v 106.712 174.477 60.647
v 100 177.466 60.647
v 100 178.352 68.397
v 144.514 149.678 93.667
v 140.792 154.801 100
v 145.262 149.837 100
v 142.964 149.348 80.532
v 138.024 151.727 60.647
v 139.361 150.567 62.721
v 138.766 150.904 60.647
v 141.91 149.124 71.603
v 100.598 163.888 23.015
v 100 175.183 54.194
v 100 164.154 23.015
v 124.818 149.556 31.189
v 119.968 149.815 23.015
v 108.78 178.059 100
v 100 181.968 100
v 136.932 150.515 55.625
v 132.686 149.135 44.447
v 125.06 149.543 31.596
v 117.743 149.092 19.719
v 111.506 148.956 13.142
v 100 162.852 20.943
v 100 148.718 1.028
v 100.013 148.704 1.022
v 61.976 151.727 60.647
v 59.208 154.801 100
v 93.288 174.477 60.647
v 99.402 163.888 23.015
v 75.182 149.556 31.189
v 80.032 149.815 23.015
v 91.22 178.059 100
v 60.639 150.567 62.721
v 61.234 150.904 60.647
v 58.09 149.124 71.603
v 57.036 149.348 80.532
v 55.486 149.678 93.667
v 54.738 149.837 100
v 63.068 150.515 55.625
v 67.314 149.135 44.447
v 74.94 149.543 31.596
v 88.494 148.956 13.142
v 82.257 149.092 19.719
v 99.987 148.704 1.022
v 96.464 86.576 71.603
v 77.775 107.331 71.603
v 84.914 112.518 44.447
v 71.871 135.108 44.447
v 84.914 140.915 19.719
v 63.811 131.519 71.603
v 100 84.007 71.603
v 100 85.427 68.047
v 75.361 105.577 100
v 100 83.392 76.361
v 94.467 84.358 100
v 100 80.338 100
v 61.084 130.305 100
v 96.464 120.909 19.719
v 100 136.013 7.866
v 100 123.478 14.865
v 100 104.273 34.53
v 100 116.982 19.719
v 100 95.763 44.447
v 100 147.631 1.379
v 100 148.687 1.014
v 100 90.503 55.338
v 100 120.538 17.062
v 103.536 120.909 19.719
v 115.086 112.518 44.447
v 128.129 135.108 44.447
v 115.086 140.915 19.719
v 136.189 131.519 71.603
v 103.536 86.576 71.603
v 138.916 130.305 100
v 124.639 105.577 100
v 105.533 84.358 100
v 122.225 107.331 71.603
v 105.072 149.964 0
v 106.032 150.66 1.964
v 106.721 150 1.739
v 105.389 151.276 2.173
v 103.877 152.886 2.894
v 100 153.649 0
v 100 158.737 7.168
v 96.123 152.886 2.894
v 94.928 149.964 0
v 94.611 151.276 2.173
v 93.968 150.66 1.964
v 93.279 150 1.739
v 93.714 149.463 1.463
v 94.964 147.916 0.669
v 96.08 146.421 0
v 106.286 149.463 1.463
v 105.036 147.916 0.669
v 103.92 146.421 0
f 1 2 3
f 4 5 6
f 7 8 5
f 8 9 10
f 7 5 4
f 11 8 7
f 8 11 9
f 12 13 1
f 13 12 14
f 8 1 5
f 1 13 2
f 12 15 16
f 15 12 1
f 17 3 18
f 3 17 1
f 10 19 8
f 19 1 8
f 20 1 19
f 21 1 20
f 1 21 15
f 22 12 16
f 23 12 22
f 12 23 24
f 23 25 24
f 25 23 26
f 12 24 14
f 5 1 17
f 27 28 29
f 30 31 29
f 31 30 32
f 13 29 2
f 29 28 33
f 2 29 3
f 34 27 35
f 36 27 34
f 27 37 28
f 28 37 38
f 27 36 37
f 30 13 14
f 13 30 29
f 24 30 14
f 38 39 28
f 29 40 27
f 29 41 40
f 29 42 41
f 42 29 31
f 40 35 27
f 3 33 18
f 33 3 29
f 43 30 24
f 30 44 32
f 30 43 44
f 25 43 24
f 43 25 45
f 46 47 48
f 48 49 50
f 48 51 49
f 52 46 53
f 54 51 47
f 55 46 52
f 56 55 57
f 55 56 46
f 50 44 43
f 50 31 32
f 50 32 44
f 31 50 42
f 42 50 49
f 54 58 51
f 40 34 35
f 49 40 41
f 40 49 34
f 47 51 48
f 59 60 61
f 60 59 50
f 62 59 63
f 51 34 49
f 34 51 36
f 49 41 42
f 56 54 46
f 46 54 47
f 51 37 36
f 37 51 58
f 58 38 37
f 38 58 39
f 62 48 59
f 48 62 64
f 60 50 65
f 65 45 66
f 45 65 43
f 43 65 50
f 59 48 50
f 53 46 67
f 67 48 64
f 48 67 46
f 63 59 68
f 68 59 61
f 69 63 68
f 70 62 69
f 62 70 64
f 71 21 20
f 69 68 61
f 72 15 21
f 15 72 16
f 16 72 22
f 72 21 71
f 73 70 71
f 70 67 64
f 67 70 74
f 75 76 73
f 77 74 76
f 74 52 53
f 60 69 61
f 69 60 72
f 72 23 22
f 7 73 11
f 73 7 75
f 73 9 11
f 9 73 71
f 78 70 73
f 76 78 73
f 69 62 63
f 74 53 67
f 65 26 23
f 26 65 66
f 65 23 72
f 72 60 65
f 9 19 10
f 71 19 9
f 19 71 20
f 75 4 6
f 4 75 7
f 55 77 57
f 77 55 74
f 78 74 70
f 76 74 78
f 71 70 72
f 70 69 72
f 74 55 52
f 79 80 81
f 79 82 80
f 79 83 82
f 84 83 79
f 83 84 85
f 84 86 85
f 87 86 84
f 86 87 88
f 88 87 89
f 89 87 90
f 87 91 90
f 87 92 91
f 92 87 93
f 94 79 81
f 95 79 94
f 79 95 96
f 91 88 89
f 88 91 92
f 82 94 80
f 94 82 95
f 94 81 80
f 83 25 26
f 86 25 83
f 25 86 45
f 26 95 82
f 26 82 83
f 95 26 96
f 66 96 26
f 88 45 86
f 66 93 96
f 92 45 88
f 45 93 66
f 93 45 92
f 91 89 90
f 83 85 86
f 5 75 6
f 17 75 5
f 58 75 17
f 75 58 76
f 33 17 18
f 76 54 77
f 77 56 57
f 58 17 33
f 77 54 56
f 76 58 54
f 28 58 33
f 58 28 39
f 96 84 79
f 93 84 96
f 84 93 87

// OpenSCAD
height = 100;
width = 200;
depth = 200;

drawDebug = true;

pullAnchors = [[0,0,height],[width,0,height],[width,depth,height],[0,depth,height]];

pushAnchors = [[width/2,depth/2,height]];

coreXYDistance = 20;
coreZDistance = 0;
corePullAnchorsRel = [
[-sin(45)*coreXYDistance, -sin(45)*coreXYDistance, coreZDistance],
[ sin(45)*coreXYDistance, -sin(45)*coreXYDistance, coreZDistance],
[ sin(45)*coreXYDistance,  sin(45)*coreXYDistance, coreZDistance],
[-sin(45)*coreXYDistance,  sin(45)*coreXYDistance, coreZDistance]
];

corePushAnchorsRel = [
[0,0,5]
];

x = width/2 + width/4*sin($t*360);
y = depth/2 + depth/4*cos($t*360);
z = 0;
core = [x,y,z];

rawPullLengths = [for(i = [0:1:len(pullAnchors)-1]) 
    norm(pullAnchors[i]-(core+corePullAnchorsRel[i])) ];

rawPushLengths = [for(i = [0:1:len(pushAnchors)-1]) 
    norm(pushAnchors[i]-(core+corePushAnchorsRel[i])) ];

pullLengths = rawPullLengths;
pushLengths = rawPushLengths;



pushStretch = 1;
pullStretch = 4;
colors = ["LimeGreen","MediumVioletRed","Crimson","DodgerBlue","Silver"];

corePullAnchors = [ for(i = [0:1:len(pullAnchors)-1]) corePullAnchorsRel[i]+core ];
corePushAnchors = [ for(i = [0:1:len(pushAnchors)-1]) corePushAnchorsRel[i]+core ];



transparency = 0.1;


intersection(){
union(){
color("Red")
intersection_for(i  = [0:1:len(pullAnchors)-1]){
        translate(pullAnchors[i]-corePullAnchorsRel[i])
        sphere(r=pullLengths[i]-0.01);
};

difference(){
    color("White")
    intersection_for(i  = [0:1:len(pullAnchors)-1]){
        translate(pullAnchors[i]-corePullAnchorsRel[i])
        sphere(r=pullLengths[i]+pullStretch);
    }
    
    for(i  = [0:1:len(pushAnchors)-1])
    translate(pushAnchors[i]-corePushAnchorsRel[i])
    sphere(r=pushLengths[i]-pushStretch);
}
}

cube([width,depth,height]);
}


if($preview && drawDebug)
for(i  = [0:1:len(pushAnchors)-1])
color(colors[i+len(pullAnchors)], transparency*2)
translate(pushAnchors[i])
sphere(5);

if($preview && drawDebug)
for(i  = [0:1:len(pushAnchors)-1])
color(colors[i+len(pullAnchors)], transparency*2)
translate(corePushAnchors[i])
sphere(5);

if($preview && drawDebug)
for(i  = [0:1:len(pullAnchors)-1])
color(colors[i], transparency*2)
translate(pullAnchors[i])
sphere(5);

if($preview && drawDebug)
for(i  = [0:1:len(pullAnchors)-1])
color(colors[i], transparency*2)
translate(corePullAnchors[i])
sphere(5);

if($preview && drawDebug)
for(i  = [0:1:len(pushAnchors)-1])
color(colors[i+len(pullAnchors)], transparency)
translate(pushAnchors[i])
sphere(r=pushLengths[i]);

if($preview && drawDebug)
for(i  = [0:1:len(pullAnchors)-1])
color(colors[i], transparency)
translate(pullAnchors[i])
render()
sphere(r=pullLengths[i]);


$fa = $preview ? 8 : 12 ;
$fs = $preview ? 0.5 : 1 ;
